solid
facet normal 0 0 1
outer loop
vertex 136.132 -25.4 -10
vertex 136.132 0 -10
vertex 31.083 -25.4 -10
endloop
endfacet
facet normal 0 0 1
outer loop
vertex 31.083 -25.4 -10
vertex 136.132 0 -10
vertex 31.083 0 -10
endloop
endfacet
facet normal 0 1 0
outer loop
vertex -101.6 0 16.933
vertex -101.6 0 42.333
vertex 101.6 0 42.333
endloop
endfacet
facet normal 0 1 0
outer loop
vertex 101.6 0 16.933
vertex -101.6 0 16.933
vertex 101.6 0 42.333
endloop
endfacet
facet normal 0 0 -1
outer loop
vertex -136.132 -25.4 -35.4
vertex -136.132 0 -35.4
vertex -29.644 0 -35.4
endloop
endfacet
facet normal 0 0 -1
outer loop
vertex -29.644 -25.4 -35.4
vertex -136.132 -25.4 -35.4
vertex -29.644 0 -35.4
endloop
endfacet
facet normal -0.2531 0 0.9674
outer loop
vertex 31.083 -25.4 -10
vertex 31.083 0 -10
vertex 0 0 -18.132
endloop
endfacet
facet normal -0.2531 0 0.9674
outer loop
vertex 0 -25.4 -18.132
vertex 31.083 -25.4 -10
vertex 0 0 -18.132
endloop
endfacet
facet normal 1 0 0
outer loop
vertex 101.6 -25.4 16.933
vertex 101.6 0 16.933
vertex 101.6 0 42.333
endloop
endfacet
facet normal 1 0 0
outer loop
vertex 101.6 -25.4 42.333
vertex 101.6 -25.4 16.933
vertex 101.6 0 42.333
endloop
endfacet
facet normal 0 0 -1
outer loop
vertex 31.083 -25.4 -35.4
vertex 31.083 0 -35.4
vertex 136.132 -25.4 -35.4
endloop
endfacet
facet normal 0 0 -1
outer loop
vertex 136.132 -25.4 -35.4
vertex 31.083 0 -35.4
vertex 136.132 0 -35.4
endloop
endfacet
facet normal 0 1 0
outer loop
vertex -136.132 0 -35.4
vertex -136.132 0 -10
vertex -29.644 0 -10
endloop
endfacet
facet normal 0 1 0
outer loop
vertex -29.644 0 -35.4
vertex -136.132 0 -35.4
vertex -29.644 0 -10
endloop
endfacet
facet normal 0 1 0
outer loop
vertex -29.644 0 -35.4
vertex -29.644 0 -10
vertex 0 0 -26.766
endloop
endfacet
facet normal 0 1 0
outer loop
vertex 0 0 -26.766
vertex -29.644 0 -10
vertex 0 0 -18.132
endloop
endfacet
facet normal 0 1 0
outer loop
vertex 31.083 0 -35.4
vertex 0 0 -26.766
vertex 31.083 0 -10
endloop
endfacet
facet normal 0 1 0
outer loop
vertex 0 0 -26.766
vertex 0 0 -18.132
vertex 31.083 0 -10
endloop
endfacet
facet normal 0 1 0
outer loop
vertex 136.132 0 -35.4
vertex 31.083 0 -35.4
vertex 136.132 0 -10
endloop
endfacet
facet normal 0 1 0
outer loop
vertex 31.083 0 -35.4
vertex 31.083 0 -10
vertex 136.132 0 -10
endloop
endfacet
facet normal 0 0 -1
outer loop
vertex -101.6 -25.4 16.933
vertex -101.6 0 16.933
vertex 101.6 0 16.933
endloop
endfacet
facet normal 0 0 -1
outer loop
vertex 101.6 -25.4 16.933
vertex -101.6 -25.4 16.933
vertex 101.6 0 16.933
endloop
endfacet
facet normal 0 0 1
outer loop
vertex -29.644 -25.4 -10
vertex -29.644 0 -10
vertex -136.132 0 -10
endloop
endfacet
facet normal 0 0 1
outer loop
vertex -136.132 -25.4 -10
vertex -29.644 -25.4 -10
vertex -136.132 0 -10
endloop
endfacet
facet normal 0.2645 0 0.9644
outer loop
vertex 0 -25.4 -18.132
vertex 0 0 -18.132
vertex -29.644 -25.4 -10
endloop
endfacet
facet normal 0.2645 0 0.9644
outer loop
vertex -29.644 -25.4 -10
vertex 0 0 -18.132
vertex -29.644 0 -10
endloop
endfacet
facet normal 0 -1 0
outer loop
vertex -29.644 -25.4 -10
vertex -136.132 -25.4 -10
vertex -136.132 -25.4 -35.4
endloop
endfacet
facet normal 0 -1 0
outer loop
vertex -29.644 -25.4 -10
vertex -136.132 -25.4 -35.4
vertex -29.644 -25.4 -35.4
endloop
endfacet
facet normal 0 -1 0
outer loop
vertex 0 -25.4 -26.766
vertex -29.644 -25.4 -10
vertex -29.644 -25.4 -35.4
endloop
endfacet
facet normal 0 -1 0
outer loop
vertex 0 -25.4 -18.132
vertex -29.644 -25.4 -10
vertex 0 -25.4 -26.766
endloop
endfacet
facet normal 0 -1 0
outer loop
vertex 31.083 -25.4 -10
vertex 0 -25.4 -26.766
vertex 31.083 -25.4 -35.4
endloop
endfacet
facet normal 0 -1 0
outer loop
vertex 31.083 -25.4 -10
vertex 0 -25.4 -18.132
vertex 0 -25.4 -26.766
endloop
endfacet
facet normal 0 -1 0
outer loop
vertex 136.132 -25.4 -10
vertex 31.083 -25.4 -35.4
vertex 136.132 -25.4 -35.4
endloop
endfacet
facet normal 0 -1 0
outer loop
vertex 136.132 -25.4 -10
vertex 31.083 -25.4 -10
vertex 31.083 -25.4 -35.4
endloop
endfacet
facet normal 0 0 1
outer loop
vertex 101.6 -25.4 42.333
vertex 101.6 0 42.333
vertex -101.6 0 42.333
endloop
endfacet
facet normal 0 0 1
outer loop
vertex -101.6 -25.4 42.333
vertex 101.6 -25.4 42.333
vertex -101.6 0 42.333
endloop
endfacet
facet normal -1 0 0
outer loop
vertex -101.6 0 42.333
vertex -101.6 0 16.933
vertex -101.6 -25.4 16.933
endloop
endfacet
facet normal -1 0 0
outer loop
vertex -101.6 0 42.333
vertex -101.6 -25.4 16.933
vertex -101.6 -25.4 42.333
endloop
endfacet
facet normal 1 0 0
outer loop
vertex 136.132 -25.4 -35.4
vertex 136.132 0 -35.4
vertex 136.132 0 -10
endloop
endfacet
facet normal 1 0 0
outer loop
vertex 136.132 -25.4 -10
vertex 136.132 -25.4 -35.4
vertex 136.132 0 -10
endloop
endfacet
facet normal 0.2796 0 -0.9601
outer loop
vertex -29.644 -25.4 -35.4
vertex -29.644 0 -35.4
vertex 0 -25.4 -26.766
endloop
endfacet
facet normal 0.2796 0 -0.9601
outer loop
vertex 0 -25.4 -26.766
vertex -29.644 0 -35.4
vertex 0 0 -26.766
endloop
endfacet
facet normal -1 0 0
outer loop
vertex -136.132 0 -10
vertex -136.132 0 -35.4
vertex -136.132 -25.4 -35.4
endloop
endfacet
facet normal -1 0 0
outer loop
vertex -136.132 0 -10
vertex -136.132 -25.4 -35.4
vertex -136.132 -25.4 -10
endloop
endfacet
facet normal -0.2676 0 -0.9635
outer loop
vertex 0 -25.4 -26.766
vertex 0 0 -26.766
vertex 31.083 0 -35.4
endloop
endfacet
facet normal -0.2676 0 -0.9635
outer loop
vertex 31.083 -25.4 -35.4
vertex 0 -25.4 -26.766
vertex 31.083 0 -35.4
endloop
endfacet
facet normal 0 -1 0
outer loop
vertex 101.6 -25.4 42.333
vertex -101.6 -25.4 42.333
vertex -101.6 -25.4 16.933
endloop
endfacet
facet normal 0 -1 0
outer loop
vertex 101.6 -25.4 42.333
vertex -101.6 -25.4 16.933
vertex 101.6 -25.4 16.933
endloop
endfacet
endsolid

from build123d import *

# Parameters (mm, degrees)
F0_W     = 22.885122633
F0_H     = 25.4
F0_W_2   = 155.7029187679
F0_W_3   = 24.6119585991
F1_DEPTH = 25.4
F0_W_4   = 16.8366357684
F0_W_5   = 18.5634717345


with BuildPart() as f1:
    # F0 (on Front) → F1 (new body)
    with BuildSketch(Plane.XZ):
        with Locations((-90.1574386835, 29.6333333333)):
            Rectangle(F0_W, F0_H)
        with Locations((-0.8634179831, 29.6333333333)):
            Rectangle(F0_W_2, F0_H)
        with Locations((89.2940207005, 29.6333333333)):
            Rectangle(F0_W_3, F0_H)
    extrude(amount=F1_DEPTH)


with BuildPart() as f1b:
    # F0 (on Front) → F1, piece 2 (new body)
    with BuildSketch(Plane.XZ):
        with Locations((-127.7138032019, -22.7001075029)):
            Rectangle(F0_W_4, F0_H)
        Polygon((-119.2954853177, -10.0001075029), (-119.2954853177, -35.4001075029), (-29.6439938247, -35.4001075029), (0, -26.7659369856), (31.0830250382, -35.4001075029), (117.5686493516, -35.4001075029), (117.5686493516, -10.0001075029), (31.0830250382, -10.0001075029), (0, -18.131762743), (-29.6439938247, -10.0001075029), align=None)
        with Locations((126.8503852189, -22.7001075029)):
            Rectangle(F0_W_5, F0_H)
    extrude(amount=F1_DEPTH)


solid = Compound([f1.part, f1b.part])
